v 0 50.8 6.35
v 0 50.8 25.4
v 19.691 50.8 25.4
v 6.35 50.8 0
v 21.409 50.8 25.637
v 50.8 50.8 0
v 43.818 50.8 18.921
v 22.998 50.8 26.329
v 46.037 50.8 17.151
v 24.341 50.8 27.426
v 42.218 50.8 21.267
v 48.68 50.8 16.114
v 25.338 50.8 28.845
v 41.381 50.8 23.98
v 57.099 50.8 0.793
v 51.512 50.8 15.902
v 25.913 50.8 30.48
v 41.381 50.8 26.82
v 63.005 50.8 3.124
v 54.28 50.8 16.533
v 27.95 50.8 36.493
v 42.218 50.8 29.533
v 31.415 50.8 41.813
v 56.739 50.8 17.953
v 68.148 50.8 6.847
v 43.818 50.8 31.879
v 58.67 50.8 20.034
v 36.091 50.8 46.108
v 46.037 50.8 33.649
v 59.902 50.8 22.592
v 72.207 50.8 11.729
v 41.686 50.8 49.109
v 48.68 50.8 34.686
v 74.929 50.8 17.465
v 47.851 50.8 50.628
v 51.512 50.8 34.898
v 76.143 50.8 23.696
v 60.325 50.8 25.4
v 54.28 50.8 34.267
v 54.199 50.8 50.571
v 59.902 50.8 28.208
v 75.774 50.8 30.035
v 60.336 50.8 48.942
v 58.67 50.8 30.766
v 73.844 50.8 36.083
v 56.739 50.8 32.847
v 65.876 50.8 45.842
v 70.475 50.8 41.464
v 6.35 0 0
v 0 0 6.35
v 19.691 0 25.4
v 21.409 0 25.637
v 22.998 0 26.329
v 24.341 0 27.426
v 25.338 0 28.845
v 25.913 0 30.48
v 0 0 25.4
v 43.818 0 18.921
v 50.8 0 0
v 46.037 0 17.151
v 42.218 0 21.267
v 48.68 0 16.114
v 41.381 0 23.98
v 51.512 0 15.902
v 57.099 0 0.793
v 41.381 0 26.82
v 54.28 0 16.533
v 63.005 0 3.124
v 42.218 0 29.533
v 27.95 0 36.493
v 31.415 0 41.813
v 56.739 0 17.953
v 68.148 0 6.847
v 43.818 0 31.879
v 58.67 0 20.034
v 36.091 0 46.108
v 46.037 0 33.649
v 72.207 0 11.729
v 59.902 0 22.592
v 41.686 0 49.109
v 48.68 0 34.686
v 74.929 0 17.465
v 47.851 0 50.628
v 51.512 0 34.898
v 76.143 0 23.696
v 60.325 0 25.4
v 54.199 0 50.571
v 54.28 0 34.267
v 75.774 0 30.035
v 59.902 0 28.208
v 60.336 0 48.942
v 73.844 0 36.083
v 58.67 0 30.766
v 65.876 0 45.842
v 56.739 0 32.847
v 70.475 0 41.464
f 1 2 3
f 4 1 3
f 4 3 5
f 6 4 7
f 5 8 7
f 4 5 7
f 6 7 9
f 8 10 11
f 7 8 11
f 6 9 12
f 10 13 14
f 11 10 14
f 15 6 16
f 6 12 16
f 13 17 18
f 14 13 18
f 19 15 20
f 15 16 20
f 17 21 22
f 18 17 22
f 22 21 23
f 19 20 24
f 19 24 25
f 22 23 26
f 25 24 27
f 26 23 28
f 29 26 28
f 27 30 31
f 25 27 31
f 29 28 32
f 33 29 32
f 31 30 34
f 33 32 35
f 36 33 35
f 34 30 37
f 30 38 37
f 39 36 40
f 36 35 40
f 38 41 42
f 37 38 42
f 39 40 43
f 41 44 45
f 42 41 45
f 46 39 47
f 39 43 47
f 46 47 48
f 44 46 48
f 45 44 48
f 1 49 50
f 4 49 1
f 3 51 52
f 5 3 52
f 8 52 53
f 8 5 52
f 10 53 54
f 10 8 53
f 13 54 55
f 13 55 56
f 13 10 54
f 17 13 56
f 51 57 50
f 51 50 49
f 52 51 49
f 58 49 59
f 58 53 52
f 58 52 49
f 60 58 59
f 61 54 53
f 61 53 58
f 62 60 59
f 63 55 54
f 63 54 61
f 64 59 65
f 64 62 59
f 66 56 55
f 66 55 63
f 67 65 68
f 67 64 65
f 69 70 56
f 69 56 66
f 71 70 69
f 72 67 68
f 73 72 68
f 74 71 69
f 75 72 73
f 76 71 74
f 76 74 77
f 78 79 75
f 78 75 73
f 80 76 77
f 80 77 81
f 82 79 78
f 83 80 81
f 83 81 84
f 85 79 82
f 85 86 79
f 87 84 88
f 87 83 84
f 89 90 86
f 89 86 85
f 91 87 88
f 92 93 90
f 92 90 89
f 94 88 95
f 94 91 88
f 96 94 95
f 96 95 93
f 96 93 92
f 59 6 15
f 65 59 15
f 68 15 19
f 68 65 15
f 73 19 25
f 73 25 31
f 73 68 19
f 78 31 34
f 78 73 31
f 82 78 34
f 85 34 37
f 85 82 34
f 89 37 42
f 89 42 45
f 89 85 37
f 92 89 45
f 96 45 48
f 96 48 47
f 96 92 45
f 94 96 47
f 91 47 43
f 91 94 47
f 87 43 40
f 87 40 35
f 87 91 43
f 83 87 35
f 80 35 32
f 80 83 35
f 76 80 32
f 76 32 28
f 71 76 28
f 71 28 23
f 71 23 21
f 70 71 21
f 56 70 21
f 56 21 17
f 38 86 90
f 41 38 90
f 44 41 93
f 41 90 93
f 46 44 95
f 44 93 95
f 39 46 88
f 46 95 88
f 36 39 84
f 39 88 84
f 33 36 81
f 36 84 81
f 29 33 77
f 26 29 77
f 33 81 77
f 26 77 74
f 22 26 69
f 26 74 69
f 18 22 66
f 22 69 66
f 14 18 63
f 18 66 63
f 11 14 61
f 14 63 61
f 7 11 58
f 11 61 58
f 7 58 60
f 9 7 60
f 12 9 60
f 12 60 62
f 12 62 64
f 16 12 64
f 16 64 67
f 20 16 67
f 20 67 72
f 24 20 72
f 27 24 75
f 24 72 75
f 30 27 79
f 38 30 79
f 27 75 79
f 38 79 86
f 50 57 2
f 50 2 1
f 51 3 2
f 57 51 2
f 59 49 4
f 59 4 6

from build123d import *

# Parameters (mm, degrees)
F0_R     = 9.525
F1_DEPTH = 50.8
F2_R     = 6.35
F3_SIZE  = 6.35


with BuildPart() as f1:
    # F0 (on Front) → F1 (new body)
    with BuildSketch(Plane.XZ):
        with BuildLine():
            Line((0, 25.4), (0, 0))
            Line((0, 0), (50.8, 0))
            ThreePointArc((50.8, 0), (68.760512, 43.360512), (25.4, 25.4))
            Line((25.4, 25.4), (0, 25.4))
        make_face()
        with Locations((50.8, 25.4)):
            Circle(F0_R, mode=Mode.SUBTRACT)
    extrude(amount=-F1_DEPTH)

    # F2
    f2_edges = [f1.edges().sort_by_distance(p)[0] for p in [
        (25.4, 25.4, 25.4),
    ]]
    fillet(f2_edges, radius=F2_R)

    # F3
    f3_edges = [f1.edges().sort_by_distance(p)[0] for p in [
        (0, 25.4, 0),
    ]]
    chamfer(f3_edges, length=F3_SIZE)


solid = f1.part
